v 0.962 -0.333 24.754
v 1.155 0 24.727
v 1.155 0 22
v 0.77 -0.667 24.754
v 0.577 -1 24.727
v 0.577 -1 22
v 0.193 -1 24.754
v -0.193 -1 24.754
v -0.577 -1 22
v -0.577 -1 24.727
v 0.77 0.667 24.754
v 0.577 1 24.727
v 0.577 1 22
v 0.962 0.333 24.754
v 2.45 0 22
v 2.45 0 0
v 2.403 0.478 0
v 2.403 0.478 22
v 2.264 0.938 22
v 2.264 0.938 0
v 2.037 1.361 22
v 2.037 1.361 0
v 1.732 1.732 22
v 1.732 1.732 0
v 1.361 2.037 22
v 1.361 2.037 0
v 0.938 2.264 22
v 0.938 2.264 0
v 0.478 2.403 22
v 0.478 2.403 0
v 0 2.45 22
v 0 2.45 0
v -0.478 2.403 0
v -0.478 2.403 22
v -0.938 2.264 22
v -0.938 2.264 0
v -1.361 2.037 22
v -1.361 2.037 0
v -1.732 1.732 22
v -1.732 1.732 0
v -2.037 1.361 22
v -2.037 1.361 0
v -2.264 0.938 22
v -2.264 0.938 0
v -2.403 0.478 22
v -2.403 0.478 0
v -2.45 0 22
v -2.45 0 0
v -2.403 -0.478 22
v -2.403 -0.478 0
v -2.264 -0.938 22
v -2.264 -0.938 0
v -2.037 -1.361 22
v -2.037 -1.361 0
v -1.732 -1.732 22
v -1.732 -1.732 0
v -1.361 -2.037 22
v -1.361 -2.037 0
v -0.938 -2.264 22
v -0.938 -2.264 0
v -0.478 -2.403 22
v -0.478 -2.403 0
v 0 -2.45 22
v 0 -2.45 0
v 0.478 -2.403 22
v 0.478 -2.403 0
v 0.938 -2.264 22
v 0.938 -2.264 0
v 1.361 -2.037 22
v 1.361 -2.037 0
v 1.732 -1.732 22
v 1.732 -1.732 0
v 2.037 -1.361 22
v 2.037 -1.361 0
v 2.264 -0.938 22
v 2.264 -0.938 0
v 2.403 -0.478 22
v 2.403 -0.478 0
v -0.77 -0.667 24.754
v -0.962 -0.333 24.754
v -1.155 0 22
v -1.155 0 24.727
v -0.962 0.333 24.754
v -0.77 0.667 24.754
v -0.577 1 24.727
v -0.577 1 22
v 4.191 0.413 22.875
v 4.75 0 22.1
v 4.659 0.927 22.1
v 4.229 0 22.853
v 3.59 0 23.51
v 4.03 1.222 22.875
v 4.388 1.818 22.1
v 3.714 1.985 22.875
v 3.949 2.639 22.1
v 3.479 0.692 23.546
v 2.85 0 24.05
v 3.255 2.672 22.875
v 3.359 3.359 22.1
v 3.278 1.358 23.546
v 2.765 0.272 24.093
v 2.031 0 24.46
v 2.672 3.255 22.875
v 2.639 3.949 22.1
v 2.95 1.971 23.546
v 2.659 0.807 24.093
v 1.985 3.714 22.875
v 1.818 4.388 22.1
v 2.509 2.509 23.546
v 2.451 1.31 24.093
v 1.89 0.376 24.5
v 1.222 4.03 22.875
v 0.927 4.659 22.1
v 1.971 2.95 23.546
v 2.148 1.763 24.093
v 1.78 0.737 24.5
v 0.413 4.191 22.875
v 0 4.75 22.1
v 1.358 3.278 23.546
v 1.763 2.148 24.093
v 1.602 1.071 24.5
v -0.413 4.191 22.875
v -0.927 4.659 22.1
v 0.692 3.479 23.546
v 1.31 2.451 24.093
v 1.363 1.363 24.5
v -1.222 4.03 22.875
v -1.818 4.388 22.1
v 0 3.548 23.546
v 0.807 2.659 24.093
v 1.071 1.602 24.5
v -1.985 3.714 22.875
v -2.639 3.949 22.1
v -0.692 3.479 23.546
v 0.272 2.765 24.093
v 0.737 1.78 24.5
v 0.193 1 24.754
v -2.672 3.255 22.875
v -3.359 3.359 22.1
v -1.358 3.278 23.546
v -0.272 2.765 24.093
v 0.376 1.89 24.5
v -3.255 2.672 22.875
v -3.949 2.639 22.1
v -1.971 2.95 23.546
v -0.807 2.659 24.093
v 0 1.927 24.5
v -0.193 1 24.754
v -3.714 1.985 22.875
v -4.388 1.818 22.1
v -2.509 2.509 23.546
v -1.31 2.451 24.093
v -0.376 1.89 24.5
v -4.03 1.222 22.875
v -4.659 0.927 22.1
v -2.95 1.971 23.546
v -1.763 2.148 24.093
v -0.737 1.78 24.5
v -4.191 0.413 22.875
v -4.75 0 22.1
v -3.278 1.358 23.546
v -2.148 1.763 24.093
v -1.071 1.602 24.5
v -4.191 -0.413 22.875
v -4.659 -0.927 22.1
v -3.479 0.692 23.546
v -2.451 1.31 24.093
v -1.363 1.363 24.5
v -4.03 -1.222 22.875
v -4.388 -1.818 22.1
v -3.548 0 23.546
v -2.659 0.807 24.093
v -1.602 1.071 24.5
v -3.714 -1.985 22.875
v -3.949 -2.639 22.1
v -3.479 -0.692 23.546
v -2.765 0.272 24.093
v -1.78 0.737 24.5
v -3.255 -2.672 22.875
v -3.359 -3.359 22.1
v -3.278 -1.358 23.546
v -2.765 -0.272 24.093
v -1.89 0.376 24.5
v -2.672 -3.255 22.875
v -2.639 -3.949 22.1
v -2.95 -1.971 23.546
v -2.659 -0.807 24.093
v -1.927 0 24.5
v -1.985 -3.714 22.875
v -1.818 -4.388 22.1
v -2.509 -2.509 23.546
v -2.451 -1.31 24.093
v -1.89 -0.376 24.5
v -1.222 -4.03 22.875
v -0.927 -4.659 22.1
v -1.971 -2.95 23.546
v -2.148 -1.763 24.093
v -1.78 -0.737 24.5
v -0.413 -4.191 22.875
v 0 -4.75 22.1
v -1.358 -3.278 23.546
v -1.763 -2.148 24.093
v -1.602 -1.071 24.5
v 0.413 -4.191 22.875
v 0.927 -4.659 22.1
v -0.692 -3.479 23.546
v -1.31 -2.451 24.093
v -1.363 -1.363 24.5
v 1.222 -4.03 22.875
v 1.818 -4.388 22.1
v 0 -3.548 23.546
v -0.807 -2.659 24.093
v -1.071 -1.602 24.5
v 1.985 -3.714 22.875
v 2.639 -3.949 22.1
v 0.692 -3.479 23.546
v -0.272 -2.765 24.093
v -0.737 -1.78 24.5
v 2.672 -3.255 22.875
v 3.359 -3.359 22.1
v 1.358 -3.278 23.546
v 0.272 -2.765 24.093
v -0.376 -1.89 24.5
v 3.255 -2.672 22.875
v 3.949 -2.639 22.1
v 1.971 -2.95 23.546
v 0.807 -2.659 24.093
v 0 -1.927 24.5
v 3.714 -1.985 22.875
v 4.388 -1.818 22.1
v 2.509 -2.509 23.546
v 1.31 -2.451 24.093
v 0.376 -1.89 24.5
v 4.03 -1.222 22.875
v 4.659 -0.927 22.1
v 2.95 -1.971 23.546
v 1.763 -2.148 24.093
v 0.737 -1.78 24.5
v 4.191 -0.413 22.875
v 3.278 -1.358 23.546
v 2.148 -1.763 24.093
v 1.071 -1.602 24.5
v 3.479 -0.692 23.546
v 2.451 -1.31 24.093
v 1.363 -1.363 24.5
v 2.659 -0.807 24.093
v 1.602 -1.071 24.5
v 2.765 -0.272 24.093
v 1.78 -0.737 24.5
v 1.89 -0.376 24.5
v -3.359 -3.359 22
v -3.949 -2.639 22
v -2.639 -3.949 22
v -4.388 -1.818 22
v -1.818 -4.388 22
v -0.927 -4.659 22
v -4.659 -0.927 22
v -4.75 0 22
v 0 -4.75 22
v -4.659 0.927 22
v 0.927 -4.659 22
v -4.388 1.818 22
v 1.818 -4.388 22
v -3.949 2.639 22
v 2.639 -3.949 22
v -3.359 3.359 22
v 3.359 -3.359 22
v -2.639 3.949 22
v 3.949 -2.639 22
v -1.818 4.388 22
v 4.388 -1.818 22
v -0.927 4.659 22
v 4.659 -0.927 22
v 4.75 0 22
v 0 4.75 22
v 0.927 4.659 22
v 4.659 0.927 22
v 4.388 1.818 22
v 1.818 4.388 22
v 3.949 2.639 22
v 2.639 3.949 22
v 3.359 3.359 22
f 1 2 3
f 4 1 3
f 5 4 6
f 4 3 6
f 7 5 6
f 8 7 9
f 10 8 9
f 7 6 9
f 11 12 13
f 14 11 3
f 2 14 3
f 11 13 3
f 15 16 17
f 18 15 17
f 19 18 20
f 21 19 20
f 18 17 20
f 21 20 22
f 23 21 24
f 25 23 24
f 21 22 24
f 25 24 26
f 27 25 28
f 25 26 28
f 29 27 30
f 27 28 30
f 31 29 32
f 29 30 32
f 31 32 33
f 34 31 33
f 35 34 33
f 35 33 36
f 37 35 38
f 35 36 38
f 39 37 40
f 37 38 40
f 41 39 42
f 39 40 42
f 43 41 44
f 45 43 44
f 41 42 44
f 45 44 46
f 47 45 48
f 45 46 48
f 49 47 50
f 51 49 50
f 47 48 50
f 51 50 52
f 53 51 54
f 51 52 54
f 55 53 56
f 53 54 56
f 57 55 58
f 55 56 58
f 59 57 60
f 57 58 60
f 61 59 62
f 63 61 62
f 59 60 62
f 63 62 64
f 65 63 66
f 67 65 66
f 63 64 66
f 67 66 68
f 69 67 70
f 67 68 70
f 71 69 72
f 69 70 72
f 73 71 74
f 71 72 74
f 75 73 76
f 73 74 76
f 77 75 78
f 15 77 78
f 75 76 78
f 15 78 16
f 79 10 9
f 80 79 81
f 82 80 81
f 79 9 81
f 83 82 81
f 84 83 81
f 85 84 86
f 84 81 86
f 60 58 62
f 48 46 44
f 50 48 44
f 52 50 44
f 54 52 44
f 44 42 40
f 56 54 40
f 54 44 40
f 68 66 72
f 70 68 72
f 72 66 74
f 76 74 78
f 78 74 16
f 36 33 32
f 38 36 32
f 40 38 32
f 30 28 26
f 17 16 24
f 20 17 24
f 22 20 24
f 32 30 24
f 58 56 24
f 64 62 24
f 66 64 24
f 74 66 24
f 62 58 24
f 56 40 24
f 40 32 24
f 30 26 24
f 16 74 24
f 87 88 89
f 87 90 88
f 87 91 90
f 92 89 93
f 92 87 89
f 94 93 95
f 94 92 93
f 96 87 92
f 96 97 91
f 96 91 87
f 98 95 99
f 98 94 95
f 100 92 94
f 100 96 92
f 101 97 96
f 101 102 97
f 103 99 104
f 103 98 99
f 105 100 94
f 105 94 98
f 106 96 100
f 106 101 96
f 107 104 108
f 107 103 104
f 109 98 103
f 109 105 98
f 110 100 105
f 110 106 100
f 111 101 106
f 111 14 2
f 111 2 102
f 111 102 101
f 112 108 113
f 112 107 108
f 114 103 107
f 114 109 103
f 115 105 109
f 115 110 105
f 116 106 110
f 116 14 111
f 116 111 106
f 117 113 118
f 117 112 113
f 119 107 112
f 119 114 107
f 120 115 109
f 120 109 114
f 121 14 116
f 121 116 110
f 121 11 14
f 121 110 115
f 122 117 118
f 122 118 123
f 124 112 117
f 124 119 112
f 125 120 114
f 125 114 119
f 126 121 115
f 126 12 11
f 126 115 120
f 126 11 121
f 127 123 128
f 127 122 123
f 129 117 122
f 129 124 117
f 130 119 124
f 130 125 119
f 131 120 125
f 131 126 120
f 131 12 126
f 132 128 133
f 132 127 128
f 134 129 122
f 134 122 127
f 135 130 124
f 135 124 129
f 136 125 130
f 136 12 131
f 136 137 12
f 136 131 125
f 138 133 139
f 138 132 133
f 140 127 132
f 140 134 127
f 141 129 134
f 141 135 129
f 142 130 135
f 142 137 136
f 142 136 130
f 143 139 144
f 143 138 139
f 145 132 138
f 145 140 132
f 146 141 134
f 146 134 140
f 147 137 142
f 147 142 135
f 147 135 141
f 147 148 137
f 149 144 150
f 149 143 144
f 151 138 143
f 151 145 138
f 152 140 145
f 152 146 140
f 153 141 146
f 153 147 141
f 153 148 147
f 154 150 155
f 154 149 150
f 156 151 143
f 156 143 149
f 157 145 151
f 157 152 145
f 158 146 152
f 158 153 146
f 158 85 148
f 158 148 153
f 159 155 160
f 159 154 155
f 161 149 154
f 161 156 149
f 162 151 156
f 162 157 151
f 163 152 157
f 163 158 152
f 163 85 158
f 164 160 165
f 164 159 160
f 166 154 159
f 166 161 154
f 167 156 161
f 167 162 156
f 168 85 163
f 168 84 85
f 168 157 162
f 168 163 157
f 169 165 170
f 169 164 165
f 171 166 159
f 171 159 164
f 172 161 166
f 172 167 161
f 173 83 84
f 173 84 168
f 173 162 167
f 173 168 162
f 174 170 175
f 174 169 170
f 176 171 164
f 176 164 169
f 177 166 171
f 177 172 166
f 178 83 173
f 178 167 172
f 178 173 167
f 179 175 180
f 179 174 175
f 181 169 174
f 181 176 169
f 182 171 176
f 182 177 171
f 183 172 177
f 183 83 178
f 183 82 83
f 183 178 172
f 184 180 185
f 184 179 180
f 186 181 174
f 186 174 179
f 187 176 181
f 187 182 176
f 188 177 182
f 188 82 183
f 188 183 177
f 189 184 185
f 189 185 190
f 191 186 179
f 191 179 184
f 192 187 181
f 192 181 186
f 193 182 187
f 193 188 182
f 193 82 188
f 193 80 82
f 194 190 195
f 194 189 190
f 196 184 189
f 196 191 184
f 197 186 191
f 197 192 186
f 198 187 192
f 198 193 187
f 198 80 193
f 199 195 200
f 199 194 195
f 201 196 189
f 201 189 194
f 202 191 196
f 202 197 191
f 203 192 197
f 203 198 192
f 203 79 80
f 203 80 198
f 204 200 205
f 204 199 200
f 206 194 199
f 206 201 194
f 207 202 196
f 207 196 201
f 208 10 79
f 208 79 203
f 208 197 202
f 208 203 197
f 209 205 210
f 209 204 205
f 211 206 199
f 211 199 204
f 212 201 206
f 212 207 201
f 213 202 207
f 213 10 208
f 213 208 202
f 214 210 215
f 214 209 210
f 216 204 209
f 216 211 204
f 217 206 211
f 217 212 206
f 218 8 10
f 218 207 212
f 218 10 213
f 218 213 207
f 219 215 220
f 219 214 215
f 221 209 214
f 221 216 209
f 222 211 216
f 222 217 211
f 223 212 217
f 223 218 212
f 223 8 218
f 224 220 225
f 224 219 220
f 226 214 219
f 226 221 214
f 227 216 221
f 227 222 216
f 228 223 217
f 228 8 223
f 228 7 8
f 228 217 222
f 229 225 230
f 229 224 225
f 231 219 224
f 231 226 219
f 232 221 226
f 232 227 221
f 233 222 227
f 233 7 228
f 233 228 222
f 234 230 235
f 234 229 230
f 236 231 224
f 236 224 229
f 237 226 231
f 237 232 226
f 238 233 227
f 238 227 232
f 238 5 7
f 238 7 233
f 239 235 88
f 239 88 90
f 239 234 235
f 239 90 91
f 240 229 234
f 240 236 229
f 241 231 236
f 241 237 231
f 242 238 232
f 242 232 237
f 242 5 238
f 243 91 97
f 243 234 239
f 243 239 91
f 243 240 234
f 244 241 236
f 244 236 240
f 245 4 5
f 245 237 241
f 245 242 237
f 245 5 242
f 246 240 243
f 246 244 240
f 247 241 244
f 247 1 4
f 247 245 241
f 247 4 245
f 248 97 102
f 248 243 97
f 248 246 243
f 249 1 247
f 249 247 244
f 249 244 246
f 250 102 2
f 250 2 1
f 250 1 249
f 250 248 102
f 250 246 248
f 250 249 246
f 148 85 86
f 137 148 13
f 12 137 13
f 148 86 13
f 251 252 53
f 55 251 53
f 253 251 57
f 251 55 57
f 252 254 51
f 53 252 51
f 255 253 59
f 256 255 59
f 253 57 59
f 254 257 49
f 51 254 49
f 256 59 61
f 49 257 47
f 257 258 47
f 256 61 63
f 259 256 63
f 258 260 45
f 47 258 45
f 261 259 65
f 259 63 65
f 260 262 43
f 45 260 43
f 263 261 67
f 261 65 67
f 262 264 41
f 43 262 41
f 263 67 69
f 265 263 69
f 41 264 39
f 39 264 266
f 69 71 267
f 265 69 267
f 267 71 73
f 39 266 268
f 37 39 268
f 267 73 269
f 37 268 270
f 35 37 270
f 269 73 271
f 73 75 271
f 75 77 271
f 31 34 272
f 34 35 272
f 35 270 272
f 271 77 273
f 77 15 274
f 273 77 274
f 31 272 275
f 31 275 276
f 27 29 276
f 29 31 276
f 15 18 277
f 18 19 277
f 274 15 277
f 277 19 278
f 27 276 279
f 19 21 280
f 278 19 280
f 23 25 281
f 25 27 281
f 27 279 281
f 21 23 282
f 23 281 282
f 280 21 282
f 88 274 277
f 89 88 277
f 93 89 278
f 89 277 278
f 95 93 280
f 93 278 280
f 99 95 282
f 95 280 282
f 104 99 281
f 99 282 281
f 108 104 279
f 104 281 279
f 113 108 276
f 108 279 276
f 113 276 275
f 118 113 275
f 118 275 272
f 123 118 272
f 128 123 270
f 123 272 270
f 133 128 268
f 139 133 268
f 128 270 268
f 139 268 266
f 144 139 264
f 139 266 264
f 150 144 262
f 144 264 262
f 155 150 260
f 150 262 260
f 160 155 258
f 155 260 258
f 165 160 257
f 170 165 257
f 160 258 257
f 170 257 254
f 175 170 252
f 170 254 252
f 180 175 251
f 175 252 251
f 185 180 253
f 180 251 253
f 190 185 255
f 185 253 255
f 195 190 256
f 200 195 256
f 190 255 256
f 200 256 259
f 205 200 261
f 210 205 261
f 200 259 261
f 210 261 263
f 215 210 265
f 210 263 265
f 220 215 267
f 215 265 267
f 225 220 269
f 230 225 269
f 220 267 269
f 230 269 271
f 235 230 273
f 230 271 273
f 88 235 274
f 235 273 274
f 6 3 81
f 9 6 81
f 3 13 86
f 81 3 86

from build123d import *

# Parameters (mm, degrees)
SKETCH1_R            = 2.45
BOSS_SHAFT_DEPTH     = 22
SKETCH2_R            = 4.75
BOSS_HEAD_BASE_DEPTH = 0.1
DOME_M5_FACE_RADIUS  = 4.75
DOME_M5_HEIGHT       = 2.75
CUT_HEX_DEPTH        = 3.85


with BuildPart() as part:
    # Sketch1 → Boss-Shaft (new body)
    with BuildSketch(Plane.XY):
        Circle(SKETCH1_R)
    extrude(amount=BOSS_SHAFT_DEPTH)

    # Sketch2 → Boss-Head Base (add)
    with BuildSketch(Plane.XY.offset(22)):
        Circle(SKETCH2_R)
    extrude(amount=BOSS_HEAD_BASE_DEPTH)

    # Dome-M5: a dome of height H over a round flat face of radius A is a cap of a sphere of radius (A * A + H * H) / (2 * H)
    dome_m5_r = (DOME_M5_FACE_RADIUS * DOME_M5_FACE_RADIUS + DOME_M5_HEIGHT * DOME_M5_HEIGHT) / (2 * DOME_M5_HEIGHT)
    dome_m5_base = Plane((0, 0, 22.1), z_dir=(0, 0, 1))
    with Locations(dome_m5_base.offset(DOME_M5_HEIGHT - dome_m5_r)):
        dome_m5_ball = Sphere(dome_m5_r, mode=Mode.PRIVATE)
    add(split(dome_m5_ball, bisect_by=dome_m5_base, keep=Keep.TOP, mode=Mode.PRIVATE))

    # Sketch3 → Cut-Hex (cut, through all)
    with BuildSketch(Plane(origin=(0, 0, 22), x_dir=(-1, 0, 0), z_dir=(0, 0, -1))):
        Polygon((-0.577350269, 1), (-1.154700538, 0), (-0.577350269, -1), (0.577350269, -1), (1.154700538, 0), (0.577350269, 1), align=None)
    extrude(amount=-CUT_HEX_DEPTH, mode=Mode.SUBTRACT)


solid = part.part
